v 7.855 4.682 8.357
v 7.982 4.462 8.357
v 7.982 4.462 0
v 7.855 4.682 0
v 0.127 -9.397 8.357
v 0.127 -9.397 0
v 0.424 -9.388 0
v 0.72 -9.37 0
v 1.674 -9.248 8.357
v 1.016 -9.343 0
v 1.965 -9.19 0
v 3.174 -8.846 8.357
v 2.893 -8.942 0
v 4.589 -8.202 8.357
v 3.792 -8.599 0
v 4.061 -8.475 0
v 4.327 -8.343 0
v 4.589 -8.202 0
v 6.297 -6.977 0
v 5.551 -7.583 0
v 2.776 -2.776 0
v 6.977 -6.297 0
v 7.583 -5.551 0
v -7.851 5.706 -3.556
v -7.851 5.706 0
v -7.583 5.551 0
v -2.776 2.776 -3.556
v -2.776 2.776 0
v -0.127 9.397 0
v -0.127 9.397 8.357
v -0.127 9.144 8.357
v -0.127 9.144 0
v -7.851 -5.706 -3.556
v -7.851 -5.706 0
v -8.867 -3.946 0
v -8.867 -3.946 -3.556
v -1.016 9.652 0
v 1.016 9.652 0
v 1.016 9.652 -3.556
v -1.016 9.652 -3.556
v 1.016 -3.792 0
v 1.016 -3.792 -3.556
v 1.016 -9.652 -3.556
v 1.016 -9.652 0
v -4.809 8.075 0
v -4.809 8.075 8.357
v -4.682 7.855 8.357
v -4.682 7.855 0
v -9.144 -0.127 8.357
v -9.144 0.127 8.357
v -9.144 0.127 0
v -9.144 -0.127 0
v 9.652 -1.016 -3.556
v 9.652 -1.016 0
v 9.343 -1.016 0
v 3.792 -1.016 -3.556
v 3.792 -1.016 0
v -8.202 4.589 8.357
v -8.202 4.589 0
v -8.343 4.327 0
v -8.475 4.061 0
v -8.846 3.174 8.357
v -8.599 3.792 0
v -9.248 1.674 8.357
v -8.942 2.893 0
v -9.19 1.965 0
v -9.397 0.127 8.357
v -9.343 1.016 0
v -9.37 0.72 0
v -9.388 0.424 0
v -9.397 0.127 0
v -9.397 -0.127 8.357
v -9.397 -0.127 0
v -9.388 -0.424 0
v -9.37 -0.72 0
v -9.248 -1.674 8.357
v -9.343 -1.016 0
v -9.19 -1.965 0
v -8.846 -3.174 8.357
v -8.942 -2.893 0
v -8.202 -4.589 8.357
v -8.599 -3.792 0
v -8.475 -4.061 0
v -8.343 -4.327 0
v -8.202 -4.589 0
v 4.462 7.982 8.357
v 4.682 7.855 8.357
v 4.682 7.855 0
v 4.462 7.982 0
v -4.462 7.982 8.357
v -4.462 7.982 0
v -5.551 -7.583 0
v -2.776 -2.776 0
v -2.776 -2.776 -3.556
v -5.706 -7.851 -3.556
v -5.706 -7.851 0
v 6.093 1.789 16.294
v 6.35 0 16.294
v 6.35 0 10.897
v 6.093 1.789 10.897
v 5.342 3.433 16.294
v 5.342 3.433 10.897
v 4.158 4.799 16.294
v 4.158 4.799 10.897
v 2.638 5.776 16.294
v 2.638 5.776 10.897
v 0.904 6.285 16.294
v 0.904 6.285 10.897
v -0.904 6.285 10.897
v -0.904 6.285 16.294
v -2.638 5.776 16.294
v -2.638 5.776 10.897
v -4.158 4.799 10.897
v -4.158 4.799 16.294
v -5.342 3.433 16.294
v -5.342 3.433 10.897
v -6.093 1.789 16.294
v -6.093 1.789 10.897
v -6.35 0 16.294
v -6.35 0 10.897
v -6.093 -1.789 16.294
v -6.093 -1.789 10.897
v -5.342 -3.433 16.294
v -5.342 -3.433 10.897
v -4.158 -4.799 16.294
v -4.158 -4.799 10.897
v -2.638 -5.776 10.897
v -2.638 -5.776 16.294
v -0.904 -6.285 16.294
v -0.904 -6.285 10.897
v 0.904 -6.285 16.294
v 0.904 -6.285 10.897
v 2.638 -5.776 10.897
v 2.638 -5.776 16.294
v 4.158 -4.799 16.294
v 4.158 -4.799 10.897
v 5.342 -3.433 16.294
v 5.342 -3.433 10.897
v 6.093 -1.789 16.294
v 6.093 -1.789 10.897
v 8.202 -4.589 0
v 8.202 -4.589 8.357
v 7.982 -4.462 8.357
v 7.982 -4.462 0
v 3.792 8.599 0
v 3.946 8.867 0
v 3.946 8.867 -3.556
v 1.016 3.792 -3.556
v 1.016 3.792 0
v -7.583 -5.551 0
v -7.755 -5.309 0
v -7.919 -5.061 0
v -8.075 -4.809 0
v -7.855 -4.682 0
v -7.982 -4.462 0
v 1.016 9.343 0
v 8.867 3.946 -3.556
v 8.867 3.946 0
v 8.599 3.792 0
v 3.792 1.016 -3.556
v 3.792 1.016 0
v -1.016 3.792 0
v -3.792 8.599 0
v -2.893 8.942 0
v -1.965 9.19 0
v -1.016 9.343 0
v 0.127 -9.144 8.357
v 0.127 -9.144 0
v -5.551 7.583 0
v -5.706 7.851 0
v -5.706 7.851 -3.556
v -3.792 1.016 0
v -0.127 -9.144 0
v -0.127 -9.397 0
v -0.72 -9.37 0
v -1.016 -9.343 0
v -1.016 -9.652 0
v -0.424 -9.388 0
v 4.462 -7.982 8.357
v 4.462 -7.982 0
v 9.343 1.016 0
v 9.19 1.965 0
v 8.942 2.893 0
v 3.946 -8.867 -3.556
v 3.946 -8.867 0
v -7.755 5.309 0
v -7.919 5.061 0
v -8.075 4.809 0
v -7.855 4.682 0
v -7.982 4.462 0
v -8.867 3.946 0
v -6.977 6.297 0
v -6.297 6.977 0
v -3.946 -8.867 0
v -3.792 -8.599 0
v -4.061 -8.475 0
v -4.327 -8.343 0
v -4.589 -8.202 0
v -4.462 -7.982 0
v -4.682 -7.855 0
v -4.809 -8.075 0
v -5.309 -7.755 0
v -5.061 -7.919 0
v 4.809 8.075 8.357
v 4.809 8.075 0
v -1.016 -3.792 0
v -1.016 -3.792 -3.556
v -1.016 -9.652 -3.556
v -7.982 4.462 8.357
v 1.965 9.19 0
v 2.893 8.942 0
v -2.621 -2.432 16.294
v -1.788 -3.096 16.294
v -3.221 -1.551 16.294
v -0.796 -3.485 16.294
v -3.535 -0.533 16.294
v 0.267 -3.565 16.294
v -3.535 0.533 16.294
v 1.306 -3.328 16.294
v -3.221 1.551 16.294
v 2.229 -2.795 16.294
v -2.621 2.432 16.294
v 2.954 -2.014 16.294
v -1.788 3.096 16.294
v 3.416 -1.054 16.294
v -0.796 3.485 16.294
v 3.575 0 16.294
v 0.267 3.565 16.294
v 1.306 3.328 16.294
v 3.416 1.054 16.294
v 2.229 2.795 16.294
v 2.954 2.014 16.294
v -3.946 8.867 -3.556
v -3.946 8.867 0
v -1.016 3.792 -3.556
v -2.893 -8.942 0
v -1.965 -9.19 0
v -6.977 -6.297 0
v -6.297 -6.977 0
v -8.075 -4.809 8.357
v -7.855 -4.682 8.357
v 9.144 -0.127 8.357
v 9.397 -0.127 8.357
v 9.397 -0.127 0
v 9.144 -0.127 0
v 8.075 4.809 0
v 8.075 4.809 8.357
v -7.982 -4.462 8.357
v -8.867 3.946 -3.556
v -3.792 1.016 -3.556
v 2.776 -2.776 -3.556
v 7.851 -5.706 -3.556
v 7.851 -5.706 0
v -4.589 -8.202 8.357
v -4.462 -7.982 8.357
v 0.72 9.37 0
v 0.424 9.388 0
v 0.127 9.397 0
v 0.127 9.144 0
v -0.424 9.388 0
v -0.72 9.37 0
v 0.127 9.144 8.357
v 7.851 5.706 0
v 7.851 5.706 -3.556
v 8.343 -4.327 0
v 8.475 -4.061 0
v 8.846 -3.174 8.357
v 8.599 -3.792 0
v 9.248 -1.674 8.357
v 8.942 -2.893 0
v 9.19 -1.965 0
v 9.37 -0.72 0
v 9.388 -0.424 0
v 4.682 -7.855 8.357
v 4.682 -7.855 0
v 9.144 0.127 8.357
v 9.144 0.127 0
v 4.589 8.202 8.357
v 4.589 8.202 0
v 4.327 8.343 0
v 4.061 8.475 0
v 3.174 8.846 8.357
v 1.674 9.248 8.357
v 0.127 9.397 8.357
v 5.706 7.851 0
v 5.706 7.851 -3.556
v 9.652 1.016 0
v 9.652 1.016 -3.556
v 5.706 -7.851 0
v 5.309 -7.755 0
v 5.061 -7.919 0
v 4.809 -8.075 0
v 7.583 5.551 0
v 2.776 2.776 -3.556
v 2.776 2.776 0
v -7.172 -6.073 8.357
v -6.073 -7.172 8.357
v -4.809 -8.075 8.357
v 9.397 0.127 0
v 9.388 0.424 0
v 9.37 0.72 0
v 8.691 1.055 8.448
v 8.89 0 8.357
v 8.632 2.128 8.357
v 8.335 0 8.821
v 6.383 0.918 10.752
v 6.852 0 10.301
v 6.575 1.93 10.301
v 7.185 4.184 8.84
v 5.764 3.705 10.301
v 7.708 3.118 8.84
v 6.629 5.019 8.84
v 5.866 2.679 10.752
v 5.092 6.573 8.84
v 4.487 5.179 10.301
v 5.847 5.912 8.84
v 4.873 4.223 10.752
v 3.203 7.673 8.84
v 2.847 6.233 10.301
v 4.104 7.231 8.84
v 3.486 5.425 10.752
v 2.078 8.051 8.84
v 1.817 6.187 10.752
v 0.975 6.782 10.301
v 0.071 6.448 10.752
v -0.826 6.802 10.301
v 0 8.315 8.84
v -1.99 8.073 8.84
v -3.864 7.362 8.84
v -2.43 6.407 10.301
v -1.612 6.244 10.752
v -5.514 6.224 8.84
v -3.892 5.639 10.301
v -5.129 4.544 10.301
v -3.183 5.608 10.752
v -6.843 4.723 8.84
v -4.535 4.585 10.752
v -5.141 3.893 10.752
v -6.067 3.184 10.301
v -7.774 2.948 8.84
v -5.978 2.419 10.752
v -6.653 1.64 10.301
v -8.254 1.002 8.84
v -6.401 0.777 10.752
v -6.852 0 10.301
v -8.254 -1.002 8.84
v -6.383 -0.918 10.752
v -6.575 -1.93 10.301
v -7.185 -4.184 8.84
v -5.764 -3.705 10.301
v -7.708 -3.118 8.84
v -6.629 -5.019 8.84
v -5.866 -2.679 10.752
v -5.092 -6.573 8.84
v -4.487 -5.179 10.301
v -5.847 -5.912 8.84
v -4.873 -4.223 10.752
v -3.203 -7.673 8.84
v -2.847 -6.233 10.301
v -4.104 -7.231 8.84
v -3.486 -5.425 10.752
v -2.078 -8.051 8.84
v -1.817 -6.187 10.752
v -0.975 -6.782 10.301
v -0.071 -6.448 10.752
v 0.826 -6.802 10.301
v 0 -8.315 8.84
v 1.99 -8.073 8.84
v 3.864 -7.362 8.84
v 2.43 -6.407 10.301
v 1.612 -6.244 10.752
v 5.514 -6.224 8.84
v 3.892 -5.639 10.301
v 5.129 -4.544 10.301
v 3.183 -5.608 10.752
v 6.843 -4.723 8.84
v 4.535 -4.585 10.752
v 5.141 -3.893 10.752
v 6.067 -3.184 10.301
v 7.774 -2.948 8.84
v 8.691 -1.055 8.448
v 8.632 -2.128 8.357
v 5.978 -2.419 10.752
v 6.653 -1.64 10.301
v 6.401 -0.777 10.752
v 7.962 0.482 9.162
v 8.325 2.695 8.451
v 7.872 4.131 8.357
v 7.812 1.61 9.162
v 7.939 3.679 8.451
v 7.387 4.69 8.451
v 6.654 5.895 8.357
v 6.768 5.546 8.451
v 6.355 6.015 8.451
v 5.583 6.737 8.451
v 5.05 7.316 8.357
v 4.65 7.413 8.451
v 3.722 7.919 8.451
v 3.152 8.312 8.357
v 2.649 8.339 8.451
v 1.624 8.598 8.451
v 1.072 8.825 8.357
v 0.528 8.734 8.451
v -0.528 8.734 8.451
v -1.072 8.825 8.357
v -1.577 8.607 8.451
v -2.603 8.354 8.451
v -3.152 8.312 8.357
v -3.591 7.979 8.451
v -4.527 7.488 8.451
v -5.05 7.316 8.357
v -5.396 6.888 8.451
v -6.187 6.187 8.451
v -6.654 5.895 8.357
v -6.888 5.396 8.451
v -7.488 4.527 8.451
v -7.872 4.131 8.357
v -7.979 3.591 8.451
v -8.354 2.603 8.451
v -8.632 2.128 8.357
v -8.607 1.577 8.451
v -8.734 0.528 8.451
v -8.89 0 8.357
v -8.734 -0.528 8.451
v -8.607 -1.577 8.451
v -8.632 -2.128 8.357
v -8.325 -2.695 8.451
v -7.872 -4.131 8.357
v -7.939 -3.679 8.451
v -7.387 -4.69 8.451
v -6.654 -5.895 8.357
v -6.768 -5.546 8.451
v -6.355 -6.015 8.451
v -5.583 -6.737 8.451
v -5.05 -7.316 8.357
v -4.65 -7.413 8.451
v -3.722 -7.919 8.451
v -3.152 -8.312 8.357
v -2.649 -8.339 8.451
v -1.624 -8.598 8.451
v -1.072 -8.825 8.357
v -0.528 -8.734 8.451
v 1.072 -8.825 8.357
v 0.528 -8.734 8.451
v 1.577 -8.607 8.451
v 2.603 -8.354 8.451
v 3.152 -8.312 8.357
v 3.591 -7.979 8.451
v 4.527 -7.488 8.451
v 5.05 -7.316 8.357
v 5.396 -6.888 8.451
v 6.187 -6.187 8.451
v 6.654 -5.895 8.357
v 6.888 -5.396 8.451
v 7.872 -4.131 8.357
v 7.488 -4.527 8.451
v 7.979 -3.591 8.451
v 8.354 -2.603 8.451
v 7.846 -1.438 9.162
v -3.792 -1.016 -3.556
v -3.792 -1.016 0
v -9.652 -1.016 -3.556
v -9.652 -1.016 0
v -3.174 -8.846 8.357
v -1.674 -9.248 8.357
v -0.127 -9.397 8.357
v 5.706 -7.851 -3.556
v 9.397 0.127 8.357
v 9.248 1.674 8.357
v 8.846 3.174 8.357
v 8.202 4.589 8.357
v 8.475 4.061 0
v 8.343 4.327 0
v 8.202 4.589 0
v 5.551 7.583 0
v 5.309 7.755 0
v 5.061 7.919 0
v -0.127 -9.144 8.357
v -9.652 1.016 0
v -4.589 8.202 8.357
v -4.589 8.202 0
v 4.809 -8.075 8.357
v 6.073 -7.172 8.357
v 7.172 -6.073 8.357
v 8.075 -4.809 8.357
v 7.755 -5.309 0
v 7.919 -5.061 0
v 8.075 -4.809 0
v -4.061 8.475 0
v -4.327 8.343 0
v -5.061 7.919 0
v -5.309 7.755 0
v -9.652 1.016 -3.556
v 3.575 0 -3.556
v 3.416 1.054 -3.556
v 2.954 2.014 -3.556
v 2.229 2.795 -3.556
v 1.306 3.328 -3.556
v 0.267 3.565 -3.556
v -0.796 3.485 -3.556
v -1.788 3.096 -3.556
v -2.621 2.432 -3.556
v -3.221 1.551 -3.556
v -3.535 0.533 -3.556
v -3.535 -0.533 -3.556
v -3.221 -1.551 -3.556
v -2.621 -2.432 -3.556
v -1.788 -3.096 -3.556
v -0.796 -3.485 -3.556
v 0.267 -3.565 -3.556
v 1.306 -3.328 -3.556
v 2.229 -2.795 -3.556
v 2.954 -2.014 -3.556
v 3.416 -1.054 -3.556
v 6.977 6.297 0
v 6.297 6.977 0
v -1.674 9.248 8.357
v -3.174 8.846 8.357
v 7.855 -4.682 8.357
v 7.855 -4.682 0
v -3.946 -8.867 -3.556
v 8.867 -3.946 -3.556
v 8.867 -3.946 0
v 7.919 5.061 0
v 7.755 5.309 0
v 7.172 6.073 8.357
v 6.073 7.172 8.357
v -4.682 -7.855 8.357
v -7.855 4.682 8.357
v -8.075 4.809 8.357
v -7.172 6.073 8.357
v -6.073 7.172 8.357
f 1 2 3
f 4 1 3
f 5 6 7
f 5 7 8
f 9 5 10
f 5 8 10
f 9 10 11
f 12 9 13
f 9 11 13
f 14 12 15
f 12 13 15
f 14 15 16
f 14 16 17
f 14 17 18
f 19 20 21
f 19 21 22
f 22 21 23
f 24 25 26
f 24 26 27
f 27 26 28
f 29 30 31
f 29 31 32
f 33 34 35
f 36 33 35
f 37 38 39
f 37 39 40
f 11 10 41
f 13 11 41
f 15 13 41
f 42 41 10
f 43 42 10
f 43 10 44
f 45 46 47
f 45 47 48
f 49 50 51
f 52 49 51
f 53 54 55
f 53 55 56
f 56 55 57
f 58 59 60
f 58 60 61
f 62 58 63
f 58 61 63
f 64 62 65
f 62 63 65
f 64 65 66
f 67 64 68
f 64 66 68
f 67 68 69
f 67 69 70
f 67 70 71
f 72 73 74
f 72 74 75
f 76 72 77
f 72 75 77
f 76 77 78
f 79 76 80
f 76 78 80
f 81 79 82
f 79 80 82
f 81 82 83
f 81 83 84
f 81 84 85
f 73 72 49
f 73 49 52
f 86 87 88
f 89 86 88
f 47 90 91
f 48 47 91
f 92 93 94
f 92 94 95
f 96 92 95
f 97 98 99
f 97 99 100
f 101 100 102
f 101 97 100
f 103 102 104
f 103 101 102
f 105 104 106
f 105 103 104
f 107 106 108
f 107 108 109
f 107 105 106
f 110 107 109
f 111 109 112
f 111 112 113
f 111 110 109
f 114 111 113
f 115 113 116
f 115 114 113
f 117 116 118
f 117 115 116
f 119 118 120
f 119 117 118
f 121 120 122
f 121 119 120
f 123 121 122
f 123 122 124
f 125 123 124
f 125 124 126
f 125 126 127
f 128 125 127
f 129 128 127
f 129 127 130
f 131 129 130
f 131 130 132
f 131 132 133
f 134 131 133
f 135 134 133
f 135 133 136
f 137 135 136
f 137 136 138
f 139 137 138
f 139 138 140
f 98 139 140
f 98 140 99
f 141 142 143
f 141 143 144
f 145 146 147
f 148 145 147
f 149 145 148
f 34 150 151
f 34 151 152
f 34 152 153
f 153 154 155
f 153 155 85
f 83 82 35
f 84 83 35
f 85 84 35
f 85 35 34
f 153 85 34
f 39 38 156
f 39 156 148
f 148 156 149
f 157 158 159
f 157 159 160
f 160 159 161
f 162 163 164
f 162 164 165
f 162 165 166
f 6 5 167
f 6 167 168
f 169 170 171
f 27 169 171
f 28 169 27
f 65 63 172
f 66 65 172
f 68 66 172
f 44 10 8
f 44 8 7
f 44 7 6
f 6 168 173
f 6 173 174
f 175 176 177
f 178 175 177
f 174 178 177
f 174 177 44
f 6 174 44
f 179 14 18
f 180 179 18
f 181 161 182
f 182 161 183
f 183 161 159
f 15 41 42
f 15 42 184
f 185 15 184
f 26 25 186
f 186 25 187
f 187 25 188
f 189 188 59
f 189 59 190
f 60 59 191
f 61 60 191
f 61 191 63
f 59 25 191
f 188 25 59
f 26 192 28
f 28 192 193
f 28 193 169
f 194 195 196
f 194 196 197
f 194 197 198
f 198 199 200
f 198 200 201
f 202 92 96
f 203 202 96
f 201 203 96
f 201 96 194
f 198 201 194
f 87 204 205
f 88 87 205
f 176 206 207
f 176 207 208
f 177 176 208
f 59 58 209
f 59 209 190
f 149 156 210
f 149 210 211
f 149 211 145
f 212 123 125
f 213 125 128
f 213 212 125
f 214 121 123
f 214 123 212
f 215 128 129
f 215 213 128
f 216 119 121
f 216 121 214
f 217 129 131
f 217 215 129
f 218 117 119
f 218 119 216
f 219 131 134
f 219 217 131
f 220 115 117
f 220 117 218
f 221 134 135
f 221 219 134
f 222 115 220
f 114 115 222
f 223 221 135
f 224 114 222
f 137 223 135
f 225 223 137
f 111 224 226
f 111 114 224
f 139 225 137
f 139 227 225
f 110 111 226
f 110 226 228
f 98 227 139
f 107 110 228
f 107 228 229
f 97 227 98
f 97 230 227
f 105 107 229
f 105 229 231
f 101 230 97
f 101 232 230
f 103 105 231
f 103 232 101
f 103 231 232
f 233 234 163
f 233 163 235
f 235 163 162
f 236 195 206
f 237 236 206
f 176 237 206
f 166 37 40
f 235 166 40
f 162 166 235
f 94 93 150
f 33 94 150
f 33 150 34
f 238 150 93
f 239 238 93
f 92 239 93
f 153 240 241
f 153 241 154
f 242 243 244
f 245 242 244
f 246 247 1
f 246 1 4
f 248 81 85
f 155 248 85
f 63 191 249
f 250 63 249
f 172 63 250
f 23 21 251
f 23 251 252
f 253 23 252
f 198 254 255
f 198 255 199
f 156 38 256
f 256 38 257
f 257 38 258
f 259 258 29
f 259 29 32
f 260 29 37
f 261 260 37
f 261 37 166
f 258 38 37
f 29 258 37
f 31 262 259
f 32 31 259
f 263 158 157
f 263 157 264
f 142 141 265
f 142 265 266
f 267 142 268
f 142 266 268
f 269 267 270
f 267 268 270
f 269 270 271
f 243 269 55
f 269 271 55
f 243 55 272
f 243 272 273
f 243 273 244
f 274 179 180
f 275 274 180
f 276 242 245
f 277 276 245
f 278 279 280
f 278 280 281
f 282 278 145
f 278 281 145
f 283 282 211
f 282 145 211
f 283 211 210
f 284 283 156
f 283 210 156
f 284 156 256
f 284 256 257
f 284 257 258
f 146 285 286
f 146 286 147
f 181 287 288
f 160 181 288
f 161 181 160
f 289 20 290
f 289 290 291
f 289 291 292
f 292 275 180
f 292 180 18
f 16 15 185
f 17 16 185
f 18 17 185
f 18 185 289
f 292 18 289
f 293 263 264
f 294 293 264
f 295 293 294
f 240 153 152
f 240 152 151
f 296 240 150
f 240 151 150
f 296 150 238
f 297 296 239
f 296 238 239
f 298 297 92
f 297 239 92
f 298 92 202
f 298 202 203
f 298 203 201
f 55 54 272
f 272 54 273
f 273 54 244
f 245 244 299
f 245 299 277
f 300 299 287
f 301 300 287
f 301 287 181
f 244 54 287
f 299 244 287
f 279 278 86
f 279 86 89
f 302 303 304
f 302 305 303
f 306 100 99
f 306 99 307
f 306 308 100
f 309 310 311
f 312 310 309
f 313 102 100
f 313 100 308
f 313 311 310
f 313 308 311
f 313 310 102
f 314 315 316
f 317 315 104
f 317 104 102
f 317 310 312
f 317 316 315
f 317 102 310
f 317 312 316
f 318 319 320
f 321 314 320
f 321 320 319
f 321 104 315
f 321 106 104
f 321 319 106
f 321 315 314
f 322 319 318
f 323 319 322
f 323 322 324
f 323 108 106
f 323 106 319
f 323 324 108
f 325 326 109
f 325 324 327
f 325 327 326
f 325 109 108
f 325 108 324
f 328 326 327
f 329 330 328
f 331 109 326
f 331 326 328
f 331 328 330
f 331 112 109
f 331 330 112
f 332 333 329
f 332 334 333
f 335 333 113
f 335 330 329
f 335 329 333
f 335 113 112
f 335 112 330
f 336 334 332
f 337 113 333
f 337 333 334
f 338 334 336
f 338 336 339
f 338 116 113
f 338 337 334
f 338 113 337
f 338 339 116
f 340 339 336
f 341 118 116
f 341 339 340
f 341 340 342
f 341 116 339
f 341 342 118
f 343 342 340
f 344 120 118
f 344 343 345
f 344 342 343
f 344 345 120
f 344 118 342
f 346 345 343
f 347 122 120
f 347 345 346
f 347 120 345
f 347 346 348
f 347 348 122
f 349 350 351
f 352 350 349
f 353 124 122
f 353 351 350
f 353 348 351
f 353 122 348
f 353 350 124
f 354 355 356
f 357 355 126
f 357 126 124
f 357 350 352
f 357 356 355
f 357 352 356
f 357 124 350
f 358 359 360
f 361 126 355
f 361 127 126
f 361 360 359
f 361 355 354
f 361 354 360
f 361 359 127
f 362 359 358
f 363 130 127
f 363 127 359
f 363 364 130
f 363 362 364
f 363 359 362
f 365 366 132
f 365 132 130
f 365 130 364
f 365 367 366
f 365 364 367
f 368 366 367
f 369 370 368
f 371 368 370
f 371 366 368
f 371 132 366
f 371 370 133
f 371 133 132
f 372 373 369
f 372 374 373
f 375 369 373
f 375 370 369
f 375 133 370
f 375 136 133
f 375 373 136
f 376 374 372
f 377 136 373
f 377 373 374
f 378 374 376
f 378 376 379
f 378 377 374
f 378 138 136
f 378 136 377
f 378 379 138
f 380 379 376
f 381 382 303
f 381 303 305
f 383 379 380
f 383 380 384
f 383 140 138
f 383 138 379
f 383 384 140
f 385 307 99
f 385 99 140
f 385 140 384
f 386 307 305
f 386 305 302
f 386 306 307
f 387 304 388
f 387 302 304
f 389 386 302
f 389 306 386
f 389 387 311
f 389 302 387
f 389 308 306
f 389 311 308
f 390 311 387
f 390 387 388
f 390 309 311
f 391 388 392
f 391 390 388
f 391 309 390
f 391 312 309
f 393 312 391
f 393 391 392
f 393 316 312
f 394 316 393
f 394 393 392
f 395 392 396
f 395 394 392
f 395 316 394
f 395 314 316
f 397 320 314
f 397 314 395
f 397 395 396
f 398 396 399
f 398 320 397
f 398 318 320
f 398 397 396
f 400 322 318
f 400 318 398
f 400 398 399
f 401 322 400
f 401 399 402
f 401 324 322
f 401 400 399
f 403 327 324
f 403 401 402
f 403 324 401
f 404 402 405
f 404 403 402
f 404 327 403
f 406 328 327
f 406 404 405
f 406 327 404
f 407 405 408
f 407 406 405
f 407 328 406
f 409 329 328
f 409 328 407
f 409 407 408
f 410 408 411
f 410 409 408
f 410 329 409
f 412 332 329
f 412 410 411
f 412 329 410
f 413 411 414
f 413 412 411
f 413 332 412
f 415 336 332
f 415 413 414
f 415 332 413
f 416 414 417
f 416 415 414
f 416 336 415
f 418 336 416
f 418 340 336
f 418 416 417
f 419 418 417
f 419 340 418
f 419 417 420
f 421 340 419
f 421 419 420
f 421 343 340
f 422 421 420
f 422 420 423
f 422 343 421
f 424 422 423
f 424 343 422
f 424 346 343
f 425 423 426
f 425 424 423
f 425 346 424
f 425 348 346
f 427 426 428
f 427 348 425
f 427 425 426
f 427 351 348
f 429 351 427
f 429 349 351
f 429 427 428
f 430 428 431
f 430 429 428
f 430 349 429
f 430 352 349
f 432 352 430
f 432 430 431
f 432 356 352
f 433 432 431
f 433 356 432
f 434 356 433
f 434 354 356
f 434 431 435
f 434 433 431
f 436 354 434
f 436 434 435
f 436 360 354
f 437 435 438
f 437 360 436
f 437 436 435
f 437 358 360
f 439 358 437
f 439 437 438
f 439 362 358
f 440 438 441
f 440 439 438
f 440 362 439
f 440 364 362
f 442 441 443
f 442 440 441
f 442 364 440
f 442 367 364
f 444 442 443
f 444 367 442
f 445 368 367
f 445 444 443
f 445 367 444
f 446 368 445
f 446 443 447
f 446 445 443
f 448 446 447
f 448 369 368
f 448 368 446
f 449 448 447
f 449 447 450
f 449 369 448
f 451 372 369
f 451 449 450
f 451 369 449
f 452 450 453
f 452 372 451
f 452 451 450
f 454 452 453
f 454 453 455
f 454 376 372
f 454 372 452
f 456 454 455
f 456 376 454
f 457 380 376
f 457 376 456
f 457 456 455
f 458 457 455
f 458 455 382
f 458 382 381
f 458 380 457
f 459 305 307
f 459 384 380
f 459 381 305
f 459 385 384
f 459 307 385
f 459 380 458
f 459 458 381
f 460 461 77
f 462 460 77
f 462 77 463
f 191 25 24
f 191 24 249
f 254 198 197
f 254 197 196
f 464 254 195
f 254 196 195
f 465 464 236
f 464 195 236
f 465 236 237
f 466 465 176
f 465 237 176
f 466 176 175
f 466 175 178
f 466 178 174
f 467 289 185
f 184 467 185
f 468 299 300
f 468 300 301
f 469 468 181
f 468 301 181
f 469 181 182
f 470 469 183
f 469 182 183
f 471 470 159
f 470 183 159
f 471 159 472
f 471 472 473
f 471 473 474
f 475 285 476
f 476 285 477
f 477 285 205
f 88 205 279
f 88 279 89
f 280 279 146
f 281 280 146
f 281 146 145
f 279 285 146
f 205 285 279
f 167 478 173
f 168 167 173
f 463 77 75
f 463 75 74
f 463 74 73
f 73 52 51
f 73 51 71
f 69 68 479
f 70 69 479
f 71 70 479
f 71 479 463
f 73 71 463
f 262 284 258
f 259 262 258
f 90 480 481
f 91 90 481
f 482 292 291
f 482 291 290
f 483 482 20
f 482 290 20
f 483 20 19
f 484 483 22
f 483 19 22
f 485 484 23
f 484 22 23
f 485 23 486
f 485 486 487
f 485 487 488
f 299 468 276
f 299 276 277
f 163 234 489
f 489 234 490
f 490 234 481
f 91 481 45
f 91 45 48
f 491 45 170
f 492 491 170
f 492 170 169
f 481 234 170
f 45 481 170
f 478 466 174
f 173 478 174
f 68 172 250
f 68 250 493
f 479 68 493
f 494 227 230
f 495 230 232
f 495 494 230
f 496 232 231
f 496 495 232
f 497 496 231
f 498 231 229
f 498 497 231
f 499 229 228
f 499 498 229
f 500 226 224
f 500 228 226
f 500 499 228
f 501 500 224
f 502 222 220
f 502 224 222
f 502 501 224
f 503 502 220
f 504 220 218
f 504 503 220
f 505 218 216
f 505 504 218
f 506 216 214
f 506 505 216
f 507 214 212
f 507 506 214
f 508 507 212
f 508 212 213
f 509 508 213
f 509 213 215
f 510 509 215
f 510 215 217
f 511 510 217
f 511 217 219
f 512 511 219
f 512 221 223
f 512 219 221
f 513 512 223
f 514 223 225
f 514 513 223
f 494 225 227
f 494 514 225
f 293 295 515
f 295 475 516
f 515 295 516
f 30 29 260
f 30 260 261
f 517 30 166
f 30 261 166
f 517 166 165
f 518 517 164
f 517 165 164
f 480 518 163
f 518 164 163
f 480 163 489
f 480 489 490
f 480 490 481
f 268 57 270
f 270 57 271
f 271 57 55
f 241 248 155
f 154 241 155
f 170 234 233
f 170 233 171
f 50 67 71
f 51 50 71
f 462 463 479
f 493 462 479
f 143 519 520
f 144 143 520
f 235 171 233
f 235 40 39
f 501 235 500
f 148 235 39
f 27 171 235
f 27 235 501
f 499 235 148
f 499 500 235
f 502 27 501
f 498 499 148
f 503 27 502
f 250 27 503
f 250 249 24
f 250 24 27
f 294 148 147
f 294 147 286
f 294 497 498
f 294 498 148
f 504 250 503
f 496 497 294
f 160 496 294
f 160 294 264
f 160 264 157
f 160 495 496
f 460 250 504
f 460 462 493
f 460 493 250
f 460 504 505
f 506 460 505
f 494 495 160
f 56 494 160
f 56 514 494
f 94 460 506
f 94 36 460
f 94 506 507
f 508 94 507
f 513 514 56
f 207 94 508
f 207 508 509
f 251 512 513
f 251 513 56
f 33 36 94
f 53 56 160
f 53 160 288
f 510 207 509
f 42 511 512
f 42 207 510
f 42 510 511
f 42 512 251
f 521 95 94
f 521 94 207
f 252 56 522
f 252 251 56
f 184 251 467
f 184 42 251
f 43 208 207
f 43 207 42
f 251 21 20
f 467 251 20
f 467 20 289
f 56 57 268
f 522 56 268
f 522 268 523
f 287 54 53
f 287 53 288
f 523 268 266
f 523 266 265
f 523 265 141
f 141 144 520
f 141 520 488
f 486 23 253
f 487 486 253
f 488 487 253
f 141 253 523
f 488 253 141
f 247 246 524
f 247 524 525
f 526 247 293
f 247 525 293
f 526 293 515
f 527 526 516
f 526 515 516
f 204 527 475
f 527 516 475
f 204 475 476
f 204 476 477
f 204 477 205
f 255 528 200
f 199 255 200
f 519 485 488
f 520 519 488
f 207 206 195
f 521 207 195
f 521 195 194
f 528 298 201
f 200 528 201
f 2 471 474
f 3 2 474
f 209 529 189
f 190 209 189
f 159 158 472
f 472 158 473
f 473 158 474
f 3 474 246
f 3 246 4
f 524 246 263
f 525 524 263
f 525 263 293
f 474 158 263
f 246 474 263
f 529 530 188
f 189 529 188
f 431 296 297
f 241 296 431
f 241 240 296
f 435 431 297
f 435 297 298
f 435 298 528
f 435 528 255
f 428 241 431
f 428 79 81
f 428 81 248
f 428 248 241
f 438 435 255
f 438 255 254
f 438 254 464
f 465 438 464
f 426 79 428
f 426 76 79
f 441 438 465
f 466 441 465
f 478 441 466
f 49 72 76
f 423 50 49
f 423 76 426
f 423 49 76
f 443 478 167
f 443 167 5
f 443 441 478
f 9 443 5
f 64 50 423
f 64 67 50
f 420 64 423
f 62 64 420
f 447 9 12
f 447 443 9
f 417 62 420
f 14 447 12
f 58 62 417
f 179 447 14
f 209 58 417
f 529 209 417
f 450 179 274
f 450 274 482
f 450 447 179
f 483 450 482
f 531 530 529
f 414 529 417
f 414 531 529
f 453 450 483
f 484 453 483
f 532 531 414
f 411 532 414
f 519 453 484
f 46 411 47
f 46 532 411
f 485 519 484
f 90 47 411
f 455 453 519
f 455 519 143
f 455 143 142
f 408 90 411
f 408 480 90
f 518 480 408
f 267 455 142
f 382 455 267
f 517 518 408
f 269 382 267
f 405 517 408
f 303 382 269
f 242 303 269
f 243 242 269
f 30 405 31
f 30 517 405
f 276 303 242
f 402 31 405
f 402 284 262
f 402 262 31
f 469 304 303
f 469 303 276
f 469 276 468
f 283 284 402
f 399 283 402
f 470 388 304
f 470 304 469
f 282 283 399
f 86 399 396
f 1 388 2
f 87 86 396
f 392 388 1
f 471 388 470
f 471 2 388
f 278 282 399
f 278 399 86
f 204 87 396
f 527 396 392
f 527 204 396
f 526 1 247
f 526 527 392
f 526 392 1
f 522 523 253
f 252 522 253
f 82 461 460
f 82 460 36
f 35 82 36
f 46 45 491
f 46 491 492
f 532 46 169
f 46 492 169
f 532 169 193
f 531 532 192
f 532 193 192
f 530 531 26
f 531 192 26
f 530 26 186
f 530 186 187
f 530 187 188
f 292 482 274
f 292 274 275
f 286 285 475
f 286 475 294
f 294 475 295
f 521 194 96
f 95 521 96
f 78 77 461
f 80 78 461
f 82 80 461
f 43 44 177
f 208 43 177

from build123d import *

# Parameters (mm, degrees)
SKETCH1_R               = 9.398
BOSS_EXTRUDE1_DEPTH     = 16.2941
SKETCH2_OUTSIDE_W       = 27.032
SKETCH2_OUTSIDE_H       = 27.032
SKETCH2_OUTSIDE_R       = 6.35
CUT_EXTRUDE1_DEPTH      = 7.9375
FILLET1_SIZE            = 2.54
SKETCH3_W               = 19.304
SKETCH3_H               = 2.032
BOSS_EXTRUDE2_DEPTH     = 3.556
CIRPATTERN1_COUNT       = 12
CUT_EXTRUDE2_START      = -9.398
SKETCH5_W               = 10.16
SKETCH5_H               = 0.254
CUT_EXTRUDE2_DEPTH      = 0.254
CIRPATTERN2_COUNT       = 12
CUT_EXTRUDE3_DEPTH      = 25.090427103
CUT_EXTRUDE3_DEPTH_BACK = 25.090427103
SKETCH6_R               = 3.57505


with BuildPart() as part:
    # Sketch1 → Boss-Extrude1 (new body)
    with BuildSketch(Plane.XY):
        Circle(SKETCH1_R)
    extrude(amount=BOSS_EXTRUDE1_DEPTH)

    # Sketch2 outside → Cut-Extrude1 (cut)
    with BuildSketch(Plane.XY.offset(16.2941)):
        Rectangle(SKETCH2_OUTSIDE_W, SKETCH2_OUTSIDE_H)
        Circle(SKETCH2_OUTSIDE_R, mode=Mode.SUBTRACT)
    extrude(amount=-CUT_EXTRUDE1_DEPTH, mode=Mode.SUBTRACT)

    # Fillet1
    # a fillet whose section is not a circle: 2.54 mm, written as the material it adds along each edge
    with BuildSketch(Plane(origin=(0, 0, 8.3566), x_dir=(1, 0, 0), z_dir=(0, -1, 0))) as fillet1_piece_1:
        with BuildLine():
            Bezier((6.35 + FILLET1_SIZE, 0), (6.35, 0), (6.35, FILLET1_SIZE), weights=[1, 0.047339252, 1])
            Line((6.35, FILLET1_SIZE), (6.35, 0))
            Line((6.35, 0), (6.35 + FILLET1_SIZE, 0))
        make_face()
    revolve(axis=Axis((0, 0, 8.3566), (0, 0, 1)))

    # Sketch3 → Boss-Extrude2 (add)
    with BuildSketch(Plane(origin=(0, 0, 0), x_dir=(-1, 0, 0), z_dir=(0, 0, -1))):
        Rectangle(SKETCH3_W, SKETCH3_H)
    boss_extrude2 = extrude(amount=BOSS_EXTRUDE2_DEPTH)

    # CirPattern1: Boss-Extrude2 ×12 about axis
    cirpattern1_axis = Axis((0, 0, 0), (0, 0, 1))
    for i in range(1, CIRPATTERN1_COUNT):
        add(boss_extrude2.rotate(cirpattern1_axis, i * 360 / CIRPATTERN1_COUNT))

    # Sketch5 → Cut-Extrude2 (cut)
    with BuildSketch(Plane(origin=(0, 0, 0), x_dir=(0, 0, -1), z_dir=(1, 0, 0)).offset(CUT_EXTRUDE2_START)):
        with Locations((-5.08, 0)):
            Rectangle(SKETCH5_W, SKETCH5_H)
    cut_extrude2 = extrude(amount=CUT_EXTRUDE2_DEPTH, mode=Mode.SUBTRACT)

    # CirPattern2: Cut-Extrude2 ×12 about axis
    cirpattern2_axis = Axis((0, 0, 0), (0, 0, 1))
    for i in range(1, CIRPATTERN2_COUNT):
        add(cut_extrude2.rotate(cirpattern2_axis, i * 360 / CIRPATTERN2_COUNT), mode=Mode.SUBTRACT)

    # Sketch6 → Cut-Extrude3 (cut, two sides: drawn at the far end of the back side and taken through both)
    with BuildSketch(Plane.XY.offset(16.2941).offset(-CUT_EXTRUDE3_DEPTH_BACK)):
        Circle(SKETCH6_R)
    extrude(amount=CUT_EXTRUDE3_DEPTH + CUT_EXTRUDE3_DEPTH_BACK, mode=Mode.SUBTRACT)


solid = part.part
